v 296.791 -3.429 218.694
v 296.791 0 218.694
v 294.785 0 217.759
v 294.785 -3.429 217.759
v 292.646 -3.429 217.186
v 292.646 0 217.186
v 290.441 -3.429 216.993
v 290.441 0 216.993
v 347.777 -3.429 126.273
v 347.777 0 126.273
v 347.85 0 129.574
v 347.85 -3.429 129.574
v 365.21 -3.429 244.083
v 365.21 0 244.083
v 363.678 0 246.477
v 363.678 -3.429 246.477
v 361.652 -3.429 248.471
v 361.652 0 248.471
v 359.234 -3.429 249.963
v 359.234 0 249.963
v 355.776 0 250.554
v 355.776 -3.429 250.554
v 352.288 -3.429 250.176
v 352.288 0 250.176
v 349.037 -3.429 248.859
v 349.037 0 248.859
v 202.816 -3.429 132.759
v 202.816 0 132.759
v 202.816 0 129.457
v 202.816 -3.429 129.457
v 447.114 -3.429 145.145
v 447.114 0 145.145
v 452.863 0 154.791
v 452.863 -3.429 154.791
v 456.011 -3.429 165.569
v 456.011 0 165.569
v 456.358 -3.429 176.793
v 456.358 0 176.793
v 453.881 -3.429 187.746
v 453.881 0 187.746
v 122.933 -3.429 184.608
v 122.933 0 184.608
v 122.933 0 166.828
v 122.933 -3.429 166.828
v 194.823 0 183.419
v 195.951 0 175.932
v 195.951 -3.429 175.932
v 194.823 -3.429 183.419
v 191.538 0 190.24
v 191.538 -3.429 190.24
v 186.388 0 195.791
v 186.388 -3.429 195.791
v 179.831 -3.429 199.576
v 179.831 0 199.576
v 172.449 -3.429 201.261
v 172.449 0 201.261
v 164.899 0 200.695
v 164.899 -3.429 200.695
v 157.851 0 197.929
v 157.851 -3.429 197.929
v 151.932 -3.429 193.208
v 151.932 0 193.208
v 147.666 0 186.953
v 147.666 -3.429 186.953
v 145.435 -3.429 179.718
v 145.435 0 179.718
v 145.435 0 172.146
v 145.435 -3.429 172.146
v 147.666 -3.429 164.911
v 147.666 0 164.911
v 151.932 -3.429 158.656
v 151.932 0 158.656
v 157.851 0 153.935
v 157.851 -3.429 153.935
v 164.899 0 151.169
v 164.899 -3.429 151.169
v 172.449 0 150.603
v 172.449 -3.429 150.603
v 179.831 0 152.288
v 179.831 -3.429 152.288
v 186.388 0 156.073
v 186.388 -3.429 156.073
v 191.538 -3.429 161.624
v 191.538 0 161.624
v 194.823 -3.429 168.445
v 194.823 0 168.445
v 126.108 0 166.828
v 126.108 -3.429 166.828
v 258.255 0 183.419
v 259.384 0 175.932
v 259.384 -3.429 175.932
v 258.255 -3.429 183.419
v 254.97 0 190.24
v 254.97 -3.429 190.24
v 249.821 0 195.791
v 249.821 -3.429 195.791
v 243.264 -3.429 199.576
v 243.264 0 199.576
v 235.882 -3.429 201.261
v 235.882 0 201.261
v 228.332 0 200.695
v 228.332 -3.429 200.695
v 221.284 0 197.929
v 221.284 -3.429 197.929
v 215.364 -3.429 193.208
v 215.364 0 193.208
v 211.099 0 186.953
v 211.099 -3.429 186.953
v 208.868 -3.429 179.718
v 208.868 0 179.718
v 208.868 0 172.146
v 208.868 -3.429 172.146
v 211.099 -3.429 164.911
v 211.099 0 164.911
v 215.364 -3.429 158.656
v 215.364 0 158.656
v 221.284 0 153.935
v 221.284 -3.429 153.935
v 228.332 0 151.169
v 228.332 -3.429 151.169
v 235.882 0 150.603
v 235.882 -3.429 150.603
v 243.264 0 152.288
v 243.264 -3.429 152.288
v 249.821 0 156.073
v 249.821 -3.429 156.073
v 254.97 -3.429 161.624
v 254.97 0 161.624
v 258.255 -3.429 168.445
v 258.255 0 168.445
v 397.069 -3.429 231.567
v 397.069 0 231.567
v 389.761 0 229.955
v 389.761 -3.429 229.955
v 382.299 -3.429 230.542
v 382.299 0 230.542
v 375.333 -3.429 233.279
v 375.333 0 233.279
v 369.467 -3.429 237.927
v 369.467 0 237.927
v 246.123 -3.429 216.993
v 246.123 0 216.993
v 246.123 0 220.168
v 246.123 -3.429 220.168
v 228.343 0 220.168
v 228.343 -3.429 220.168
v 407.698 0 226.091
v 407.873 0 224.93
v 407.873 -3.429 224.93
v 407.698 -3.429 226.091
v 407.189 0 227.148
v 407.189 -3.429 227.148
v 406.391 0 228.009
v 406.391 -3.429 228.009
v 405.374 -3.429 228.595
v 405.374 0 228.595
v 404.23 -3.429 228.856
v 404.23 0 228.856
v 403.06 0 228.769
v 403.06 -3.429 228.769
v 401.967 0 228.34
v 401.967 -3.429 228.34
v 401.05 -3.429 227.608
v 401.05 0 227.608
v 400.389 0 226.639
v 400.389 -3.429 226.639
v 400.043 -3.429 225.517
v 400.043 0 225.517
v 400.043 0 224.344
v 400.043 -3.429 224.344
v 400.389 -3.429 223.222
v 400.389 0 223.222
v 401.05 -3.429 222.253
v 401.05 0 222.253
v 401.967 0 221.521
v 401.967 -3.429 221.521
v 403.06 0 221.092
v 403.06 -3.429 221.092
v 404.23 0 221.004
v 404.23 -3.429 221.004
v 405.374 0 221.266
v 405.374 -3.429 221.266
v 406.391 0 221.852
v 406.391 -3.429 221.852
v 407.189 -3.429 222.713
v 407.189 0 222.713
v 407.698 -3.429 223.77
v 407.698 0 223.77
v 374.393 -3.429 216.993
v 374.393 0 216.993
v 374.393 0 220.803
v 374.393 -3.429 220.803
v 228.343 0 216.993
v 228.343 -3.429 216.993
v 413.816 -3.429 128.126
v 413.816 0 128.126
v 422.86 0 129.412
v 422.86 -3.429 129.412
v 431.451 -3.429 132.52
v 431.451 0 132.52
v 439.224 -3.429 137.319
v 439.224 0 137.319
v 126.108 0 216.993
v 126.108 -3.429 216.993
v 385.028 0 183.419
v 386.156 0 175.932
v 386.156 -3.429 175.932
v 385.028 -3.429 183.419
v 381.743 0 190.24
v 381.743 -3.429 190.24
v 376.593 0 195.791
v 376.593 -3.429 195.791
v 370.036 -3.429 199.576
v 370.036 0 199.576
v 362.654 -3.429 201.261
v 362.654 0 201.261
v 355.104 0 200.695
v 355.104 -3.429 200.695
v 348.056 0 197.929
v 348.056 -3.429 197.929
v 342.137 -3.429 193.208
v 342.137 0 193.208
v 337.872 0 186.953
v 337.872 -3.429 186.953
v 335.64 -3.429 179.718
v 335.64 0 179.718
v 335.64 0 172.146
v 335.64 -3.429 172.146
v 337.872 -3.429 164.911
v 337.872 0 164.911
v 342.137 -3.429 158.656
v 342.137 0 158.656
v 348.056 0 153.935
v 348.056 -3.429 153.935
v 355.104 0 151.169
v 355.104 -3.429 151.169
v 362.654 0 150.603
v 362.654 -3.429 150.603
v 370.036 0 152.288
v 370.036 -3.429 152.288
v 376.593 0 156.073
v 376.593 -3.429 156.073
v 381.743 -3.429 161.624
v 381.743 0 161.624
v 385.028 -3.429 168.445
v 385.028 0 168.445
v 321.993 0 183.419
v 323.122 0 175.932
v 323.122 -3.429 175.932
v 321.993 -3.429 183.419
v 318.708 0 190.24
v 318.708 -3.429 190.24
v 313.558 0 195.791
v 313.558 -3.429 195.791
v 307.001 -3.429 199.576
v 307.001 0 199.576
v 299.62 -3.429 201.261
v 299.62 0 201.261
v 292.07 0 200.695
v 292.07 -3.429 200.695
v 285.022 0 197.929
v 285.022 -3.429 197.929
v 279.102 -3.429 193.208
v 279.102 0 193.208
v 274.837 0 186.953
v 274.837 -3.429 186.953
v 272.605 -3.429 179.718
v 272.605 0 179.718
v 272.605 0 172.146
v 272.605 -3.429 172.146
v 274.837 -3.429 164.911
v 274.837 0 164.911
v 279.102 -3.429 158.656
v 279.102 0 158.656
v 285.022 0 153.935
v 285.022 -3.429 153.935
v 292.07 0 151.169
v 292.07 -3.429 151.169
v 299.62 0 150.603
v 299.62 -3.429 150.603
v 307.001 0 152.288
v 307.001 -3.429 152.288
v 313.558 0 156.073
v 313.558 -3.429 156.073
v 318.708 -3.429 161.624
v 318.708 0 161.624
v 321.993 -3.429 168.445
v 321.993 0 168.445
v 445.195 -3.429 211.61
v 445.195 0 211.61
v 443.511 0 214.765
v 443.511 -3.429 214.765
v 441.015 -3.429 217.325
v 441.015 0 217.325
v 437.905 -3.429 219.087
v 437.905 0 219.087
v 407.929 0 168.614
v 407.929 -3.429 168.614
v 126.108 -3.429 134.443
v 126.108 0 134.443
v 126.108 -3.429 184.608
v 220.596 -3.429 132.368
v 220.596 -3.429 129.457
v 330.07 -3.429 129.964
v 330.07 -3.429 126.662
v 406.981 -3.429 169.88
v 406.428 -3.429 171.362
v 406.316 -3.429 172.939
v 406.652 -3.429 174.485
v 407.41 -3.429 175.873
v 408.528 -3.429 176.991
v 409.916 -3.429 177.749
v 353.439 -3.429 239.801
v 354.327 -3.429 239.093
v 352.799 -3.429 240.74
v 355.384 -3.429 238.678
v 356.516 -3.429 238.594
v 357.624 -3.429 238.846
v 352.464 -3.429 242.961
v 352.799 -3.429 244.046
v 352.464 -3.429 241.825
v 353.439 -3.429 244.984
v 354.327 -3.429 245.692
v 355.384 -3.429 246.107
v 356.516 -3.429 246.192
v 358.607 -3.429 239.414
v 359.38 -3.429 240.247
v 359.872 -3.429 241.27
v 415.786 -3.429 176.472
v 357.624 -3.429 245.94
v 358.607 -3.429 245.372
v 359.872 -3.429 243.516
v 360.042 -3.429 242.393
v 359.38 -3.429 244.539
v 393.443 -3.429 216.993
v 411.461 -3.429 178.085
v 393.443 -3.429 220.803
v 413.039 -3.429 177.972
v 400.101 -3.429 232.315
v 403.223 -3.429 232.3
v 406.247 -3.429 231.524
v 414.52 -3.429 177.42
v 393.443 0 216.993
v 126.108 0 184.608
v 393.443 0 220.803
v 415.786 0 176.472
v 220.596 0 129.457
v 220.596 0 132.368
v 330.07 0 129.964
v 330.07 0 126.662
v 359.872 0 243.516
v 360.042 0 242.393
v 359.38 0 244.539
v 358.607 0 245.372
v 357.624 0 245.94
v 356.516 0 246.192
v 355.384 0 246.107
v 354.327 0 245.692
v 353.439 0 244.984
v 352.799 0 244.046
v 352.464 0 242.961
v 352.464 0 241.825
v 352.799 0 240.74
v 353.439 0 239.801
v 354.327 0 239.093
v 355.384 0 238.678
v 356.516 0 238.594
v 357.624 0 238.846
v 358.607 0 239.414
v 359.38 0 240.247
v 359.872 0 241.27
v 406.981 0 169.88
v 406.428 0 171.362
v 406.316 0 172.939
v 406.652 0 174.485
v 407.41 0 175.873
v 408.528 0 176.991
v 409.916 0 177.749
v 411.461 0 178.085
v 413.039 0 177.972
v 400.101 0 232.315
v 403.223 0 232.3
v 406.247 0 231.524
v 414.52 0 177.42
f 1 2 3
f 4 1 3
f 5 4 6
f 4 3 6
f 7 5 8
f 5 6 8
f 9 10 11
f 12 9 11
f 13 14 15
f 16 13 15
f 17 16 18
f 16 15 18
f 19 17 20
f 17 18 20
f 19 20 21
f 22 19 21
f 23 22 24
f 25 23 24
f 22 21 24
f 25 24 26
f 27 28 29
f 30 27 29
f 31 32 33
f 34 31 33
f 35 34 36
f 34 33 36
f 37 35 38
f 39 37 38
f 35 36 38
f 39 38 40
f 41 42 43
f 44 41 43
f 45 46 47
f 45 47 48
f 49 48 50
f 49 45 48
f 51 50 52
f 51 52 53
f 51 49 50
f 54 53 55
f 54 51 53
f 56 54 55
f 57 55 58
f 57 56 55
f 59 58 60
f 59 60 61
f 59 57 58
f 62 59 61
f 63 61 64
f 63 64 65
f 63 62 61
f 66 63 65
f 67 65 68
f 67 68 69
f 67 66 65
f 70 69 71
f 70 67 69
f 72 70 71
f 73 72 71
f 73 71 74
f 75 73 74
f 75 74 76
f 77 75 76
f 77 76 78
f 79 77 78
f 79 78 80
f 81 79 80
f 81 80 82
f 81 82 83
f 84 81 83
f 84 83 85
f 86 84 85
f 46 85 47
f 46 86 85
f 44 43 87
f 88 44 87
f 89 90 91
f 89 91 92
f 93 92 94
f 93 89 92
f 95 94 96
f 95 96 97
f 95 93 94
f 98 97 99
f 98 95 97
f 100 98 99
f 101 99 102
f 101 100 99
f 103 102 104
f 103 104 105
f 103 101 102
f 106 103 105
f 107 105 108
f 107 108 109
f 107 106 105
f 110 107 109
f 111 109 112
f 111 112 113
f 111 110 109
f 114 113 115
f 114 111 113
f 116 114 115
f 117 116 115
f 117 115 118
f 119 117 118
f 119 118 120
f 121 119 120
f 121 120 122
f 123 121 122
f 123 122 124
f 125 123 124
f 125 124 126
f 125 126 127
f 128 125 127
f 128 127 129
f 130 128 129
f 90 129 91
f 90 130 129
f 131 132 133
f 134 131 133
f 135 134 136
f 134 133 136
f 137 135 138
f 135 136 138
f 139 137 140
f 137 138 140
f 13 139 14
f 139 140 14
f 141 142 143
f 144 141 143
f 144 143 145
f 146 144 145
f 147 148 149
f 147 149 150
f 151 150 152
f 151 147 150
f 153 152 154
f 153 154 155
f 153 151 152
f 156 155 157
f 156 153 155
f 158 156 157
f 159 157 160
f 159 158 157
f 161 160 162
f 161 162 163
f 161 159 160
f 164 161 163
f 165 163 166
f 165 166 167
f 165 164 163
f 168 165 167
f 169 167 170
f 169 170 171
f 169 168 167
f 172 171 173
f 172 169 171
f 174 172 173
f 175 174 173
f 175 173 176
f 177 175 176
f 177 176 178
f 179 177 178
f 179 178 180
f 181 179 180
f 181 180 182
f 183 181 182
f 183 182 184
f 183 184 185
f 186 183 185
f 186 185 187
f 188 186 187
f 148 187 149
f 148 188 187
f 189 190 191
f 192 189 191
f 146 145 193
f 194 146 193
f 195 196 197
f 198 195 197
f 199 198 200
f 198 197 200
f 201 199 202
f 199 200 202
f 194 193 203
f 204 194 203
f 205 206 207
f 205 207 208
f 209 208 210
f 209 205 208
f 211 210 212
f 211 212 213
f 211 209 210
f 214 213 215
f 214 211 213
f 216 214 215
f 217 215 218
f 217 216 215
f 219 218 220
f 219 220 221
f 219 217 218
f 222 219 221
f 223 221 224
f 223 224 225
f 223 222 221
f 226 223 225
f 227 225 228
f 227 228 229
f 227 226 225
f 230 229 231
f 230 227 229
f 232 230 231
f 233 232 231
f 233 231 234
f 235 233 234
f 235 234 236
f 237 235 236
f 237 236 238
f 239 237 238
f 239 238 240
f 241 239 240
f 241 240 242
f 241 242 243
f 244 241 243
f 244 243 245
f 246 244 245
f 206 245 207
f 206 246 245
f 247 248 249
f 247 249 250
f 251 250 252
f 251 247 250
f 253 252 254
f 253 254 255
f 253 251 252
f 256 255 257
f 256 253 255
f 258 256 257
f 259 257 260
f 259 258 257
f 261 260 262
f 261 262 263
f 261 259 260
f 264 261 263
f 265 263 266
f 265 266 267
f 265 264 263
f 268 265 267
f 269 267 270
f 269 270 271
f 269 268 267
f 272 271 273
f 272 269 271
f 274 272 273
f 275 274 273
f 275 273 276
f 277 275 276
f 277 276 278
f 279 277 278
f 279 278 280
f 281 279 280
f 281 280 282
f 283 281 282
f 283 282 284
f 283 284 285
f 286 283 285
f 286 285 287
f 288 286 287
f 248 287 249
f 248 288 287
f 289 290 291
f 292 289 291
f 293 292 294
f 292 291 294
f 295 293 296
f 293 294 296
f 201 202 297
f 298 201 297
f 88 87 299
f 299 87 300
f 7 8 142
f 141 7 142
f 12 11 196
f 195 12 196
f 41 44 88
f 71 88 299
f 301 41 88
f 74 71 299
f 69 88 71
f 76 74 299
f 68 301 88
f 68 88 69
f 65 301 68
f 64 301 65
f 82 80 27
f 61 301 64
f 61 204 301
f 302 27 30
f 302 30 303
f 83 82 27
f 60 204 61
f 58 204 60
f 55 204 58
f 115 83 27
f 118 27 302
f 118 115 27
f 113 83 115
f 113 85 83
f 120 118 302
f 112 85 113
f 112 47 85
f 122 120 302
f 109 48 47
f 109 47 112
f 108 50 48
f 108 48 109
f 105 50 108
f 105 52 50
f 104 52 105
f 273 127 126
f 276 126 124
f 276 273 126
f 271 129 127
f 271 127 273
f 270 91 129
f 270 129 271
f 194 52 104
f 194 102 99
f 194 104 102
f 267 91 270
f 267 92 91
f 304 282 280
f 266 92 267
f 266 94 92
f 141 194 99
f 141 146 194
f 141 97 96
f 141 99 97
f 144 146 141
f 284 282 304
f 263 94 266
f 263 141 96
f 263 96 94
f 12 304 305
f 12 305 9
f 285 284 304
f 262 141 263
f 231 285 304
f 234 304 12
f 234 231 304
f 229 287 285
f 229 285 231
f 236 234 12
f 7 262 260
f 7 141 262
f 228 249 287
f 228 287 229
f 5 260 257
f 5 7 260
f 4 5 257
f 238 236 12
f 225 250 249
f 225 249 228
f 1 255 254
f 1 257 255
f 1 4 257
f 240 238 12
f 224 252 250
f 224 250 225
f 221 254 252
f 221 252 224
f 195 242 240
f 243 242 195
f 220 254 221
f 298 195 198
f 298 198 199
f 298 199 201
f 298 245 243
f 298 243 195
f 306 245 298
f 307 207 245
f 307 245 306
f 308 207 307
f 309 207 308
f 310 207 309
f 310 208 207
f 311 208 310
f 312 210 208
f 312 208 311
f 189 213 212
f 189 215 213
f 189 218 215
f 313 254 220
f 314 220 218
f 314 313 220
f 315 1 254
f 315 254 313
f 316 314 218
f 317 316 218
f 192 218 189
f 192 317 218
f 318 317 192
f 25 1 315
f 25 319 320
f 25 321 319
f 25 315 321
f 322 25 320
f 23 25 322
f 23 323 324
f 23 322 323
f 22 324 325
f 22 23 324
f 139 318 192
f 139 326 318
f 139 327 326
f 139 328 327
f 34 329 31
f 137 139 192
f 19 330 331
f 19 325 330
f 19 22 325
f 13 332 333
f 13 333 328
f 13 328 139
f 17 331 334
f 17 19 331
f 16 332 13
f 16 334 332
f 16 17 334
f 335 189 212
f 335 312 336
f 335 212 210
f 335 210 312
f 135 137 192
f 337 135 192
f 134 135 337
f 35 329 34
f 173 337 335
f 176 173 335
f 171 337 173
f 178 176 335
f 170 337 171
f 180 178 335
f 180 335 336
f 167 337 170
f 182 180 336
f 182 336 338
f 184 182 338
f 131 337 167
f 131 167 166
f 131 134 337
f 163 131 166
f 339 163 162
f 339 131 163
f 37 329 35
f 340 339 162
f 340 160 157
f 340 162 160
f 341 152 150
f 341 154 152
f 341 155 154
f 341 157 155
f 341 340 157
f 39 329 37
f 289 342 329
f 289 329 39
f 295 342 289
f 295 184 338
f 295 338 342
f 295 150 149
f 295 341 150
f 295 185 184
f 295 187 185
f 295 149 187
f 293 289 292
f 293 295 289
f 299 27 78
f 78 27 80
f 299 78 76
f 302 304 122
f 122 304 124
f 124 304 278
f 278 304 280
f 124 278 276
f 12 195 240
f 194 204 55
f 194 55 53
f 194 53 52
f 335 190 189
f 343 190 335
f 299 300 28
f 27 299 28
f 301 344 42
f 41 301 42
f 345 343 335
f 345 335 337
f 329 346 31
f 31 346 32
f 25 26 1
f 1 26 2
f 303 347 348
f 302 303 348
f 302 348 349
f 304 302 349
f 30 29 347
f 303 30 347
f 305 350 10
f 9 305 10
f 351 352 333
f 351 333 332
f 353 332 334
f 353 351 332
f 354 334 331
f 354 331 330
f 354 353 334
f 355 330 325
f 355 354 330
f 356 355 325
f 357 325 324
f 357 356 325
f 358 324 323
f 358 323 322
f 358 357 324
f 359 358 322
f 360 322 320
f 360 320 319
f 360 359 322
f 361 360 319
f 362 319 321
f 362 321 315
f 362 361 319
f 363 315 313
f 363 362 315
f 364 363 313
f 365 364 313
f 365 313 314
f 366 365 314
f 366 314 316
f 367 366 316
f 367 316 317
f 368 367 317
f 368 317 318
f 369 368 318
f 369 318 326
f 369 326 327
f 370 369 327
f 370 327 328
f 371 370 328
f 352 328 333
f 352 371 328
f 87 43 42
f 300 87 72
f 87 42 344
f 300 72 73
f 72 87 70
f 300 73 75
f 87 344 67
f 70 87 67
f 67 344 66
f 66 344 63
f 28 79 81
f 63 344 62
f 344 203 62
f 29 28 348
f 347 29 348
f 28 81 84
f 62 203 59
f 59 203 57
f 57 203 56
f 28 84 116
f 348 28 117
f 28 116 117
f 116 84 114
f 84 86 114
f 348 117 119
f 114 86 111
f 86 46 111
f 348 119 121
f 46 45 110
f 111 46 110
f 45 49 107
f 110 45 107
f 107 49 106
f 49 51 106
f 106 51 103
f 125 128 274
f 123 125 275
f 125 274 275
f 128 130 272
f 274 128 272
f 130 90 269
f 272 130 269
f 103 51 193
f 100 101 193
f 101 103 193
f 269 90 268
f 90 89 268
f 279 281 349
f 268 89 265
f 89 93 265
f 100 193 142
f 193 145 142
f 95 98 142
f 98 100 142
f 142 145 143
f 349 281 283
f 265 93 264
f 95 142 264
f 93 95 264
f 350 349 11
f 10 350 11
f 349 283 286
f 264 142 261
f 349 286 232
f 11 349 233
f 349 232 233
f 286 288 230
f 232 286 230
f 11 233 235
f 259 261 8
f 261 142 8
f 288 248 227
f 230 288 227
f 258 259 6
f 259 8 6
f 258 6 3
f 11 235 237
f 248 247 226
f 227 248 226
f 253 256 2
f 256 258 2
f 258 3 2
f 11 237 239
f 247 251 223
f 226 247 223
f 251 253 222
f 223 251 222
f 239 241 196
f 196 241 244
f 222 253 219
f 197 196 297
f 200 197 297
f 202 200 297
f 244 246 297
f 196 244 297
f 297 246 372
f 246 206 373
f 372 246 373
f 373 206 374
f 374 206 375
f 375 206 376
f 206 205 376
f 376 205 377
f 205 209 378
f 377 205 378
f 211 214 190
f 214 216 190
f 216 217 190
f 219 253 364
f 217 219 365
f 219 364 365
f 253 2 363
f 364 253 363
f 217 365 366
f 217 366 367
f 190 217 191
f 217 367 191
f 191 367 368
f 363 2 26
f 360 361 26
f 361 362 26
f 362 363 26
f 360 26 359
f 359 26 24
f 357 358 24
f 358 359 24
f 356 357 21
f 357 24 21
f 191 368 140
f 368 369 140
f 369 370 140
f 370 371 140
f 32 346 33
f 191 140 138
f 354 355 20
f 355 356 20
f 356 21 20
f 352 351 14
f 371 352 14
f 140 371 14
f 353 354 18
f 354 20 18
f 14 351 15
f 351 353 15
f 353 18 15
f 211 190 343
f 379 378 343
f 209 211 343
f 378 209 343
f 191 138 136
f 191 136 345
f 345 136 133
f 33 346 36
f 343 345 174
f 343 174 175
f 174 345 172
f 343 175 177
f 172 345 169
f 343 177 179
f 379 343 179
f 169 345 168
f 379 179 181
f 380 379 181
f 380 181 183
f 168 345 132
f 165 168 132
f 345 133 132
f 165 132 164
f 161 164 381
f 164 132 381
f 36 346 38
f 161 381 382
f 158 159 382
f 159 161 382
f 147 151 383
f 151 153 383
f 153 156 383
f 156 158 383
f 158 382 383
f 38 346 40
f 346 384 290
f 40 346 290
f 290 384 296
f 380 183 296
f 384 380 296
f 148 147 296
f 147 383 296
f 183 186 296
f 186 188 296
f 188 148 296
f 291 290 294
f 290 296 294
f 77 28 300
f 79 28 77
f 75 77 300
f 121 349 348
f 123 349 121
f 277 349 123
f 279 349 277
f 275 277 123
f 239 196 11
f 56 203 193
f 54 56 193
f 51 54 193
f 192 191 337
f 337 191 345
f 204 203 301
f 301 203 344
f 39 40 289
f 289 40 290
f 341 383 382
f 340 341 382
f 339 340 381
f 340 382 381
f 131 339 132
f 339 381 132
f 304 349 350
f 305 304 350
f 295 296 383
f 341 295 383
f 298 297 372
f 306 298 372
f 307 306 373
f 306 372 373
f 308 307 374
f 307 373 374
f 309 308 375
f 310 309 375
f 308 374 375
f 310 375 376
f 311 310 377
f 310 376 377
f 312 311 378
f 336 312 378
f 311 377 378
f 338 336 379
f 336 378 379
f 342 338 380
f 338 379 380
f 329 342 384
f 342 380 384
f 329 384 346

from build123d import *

# Parameters (mm, degrees)
F0_R     = 25.4
F0_W     = 19.05
F0_H     = 3.81
F0_R_2   = 3.81
F0_R_3   = 3.937
F1_DEPTH = 3.429


# Not quite as in the source:
# - ends of sketch curves that miss each other by under 0.0002 mm in the source are joined


with BuildPart() as f1:
    # F0 (on Front) → F1 (new body)
    with BuildSketch(Plane.XZ):
        with BuildLine():
            Line((122.9326218, 166.8279366), (126.1076218, 166.8279366))
            Line((126.1076218, 166.8279366), (126.1076218, 134.4429366))
            Line((126.1076218, 134.4429366), (202.8156218, 132.7586372))
            Line((202.8156218, 132.7586372), (202.8156218, 129.4566372))
            Line((202.8156218, 129.4566372), (220.5956218, 129.4566372))
            Line((220.5956218, 129.4566372), (220.5956218, 132.3682392))
            Line((220.5956218, 132.3682392), (330.0696218, 129.9644848))
            Line((330.0696218, 129.9644848), (330.0696218, 126.6616974))
            Line((330.0696218, 126.6616974), (347.7771302, 126.2728742))
            Line((347.7771302, 126.2728742), (347.8496218, 129.5740868))
            Line((347.8496218, 129.5740868), (413.8162158, 128.1256518))
            ThreePointArc((413.8162158, 128.1256518), (427.2355191442, 130.7449674015), (439.2238892088, 137.3189752107))
            Line((439.2238892088, 137.3189752107), (407.9287752, 168.61409))
            ThreePointArc((407.9287752, 168.61409), (407.928759747, 176.471798653), (415.786483853, 176.471798653))
            Line((415.786483853, 176.471798653), (447.1136092, 145.1446932))
            ThreePointArc((447.1136092, 145.1446932), (456.0111791953, 165.5693177048), (453.8809524214, 187.7457494791))
            Line((453.8809524214, 187.7457494791), (445.1949186, 211.6104734))
            ThreePointArc((445.1949186, 211.6104734), (442.3538053066, 216.1328975514), (437.9046056469, 219.0873571921))
            Line((437.9046056469, 219.0873571921), (406.246711, 231.5244036))
            ThreePointArc((406.246711, 231.5244036), (401.6620386638, 232.4037156495), (397.069381607, 231.5671130188))
            ThreePointArc((397.069381607, 231.5671130188), (378.7147395647, 231.6525545857), (365.2100276158, 244.0832755023))
            ThreePointArc((365.2100276158, 244.0832755023), (362.7212006534, 247.5307318984), (359.2339287197, 249.9634606203))
            ThreePointArc((359.2339287197, 249.9634606203), (354.0189561213, 250.4862087964), (349.0369734787, 248.858627921))
            Line((349.0369734787, 248.858627921), (296.7910244, 218.6944318))
            ThreePointArc((296.7910244, 218.6944318), (293.728030578, 217.4256797597), (290.4410244, 216.9929366))
            Line((290.4410244, 216.9929366), (246.1226218, 216.9929366))
            Line((246.1226218, 216.9929366), (246.1226218, 220.1679366))
            Line((246.1226218, 220.1679366), (228.3426218, 220.1679366))
            Line((228.3426218, 220.1679366), (228.3426218, 216.9929366))
            Line((228.3426218, 216.9929366), (126.1076218, 216.9929366))
            Line((126.1076218, 216.9929366), (126.1076218, 184.6079366))
            Line((126.1076218, 184.6079366), (122.9326218, 184.6079366))
            Line((122.9326218, 184.6079366), (122.9326218, 166.8279366))
        make_face()
        with Locations((170.5510686, 175.9319824)):
            Circle(F0_R, mode=Mode.SUBTRACT)
        with Locations((233.9839364, 175.9319824)):
            Circle(F0_R, mode=Mode.SUBTRACT)
        with Locations((297.721782, 175.9319824)):
            Circle(F0_R, mode=Mode.SUBTRACT)
        with Locations((360.7561746, 175.9319824)):
            Circle(F0_R, mode=Mode.SUBTRACT)
        with Locations((383.9176218, 218.8979366)):
            Rectangle(F0_W, F0_H, mode=Mode.SUBTRACT)
        with Locations((356.2316218, 242.3929366)):
            Circle(F0_R_2, mode=Mode.SUBTRACT)
        with Locations((403.935946, 224.9304366)):
            Circle(F0_R_3, mode=Mode.SUBTRACT)
    extrude(amount=F1_DEPTH)


solid = f1.part
